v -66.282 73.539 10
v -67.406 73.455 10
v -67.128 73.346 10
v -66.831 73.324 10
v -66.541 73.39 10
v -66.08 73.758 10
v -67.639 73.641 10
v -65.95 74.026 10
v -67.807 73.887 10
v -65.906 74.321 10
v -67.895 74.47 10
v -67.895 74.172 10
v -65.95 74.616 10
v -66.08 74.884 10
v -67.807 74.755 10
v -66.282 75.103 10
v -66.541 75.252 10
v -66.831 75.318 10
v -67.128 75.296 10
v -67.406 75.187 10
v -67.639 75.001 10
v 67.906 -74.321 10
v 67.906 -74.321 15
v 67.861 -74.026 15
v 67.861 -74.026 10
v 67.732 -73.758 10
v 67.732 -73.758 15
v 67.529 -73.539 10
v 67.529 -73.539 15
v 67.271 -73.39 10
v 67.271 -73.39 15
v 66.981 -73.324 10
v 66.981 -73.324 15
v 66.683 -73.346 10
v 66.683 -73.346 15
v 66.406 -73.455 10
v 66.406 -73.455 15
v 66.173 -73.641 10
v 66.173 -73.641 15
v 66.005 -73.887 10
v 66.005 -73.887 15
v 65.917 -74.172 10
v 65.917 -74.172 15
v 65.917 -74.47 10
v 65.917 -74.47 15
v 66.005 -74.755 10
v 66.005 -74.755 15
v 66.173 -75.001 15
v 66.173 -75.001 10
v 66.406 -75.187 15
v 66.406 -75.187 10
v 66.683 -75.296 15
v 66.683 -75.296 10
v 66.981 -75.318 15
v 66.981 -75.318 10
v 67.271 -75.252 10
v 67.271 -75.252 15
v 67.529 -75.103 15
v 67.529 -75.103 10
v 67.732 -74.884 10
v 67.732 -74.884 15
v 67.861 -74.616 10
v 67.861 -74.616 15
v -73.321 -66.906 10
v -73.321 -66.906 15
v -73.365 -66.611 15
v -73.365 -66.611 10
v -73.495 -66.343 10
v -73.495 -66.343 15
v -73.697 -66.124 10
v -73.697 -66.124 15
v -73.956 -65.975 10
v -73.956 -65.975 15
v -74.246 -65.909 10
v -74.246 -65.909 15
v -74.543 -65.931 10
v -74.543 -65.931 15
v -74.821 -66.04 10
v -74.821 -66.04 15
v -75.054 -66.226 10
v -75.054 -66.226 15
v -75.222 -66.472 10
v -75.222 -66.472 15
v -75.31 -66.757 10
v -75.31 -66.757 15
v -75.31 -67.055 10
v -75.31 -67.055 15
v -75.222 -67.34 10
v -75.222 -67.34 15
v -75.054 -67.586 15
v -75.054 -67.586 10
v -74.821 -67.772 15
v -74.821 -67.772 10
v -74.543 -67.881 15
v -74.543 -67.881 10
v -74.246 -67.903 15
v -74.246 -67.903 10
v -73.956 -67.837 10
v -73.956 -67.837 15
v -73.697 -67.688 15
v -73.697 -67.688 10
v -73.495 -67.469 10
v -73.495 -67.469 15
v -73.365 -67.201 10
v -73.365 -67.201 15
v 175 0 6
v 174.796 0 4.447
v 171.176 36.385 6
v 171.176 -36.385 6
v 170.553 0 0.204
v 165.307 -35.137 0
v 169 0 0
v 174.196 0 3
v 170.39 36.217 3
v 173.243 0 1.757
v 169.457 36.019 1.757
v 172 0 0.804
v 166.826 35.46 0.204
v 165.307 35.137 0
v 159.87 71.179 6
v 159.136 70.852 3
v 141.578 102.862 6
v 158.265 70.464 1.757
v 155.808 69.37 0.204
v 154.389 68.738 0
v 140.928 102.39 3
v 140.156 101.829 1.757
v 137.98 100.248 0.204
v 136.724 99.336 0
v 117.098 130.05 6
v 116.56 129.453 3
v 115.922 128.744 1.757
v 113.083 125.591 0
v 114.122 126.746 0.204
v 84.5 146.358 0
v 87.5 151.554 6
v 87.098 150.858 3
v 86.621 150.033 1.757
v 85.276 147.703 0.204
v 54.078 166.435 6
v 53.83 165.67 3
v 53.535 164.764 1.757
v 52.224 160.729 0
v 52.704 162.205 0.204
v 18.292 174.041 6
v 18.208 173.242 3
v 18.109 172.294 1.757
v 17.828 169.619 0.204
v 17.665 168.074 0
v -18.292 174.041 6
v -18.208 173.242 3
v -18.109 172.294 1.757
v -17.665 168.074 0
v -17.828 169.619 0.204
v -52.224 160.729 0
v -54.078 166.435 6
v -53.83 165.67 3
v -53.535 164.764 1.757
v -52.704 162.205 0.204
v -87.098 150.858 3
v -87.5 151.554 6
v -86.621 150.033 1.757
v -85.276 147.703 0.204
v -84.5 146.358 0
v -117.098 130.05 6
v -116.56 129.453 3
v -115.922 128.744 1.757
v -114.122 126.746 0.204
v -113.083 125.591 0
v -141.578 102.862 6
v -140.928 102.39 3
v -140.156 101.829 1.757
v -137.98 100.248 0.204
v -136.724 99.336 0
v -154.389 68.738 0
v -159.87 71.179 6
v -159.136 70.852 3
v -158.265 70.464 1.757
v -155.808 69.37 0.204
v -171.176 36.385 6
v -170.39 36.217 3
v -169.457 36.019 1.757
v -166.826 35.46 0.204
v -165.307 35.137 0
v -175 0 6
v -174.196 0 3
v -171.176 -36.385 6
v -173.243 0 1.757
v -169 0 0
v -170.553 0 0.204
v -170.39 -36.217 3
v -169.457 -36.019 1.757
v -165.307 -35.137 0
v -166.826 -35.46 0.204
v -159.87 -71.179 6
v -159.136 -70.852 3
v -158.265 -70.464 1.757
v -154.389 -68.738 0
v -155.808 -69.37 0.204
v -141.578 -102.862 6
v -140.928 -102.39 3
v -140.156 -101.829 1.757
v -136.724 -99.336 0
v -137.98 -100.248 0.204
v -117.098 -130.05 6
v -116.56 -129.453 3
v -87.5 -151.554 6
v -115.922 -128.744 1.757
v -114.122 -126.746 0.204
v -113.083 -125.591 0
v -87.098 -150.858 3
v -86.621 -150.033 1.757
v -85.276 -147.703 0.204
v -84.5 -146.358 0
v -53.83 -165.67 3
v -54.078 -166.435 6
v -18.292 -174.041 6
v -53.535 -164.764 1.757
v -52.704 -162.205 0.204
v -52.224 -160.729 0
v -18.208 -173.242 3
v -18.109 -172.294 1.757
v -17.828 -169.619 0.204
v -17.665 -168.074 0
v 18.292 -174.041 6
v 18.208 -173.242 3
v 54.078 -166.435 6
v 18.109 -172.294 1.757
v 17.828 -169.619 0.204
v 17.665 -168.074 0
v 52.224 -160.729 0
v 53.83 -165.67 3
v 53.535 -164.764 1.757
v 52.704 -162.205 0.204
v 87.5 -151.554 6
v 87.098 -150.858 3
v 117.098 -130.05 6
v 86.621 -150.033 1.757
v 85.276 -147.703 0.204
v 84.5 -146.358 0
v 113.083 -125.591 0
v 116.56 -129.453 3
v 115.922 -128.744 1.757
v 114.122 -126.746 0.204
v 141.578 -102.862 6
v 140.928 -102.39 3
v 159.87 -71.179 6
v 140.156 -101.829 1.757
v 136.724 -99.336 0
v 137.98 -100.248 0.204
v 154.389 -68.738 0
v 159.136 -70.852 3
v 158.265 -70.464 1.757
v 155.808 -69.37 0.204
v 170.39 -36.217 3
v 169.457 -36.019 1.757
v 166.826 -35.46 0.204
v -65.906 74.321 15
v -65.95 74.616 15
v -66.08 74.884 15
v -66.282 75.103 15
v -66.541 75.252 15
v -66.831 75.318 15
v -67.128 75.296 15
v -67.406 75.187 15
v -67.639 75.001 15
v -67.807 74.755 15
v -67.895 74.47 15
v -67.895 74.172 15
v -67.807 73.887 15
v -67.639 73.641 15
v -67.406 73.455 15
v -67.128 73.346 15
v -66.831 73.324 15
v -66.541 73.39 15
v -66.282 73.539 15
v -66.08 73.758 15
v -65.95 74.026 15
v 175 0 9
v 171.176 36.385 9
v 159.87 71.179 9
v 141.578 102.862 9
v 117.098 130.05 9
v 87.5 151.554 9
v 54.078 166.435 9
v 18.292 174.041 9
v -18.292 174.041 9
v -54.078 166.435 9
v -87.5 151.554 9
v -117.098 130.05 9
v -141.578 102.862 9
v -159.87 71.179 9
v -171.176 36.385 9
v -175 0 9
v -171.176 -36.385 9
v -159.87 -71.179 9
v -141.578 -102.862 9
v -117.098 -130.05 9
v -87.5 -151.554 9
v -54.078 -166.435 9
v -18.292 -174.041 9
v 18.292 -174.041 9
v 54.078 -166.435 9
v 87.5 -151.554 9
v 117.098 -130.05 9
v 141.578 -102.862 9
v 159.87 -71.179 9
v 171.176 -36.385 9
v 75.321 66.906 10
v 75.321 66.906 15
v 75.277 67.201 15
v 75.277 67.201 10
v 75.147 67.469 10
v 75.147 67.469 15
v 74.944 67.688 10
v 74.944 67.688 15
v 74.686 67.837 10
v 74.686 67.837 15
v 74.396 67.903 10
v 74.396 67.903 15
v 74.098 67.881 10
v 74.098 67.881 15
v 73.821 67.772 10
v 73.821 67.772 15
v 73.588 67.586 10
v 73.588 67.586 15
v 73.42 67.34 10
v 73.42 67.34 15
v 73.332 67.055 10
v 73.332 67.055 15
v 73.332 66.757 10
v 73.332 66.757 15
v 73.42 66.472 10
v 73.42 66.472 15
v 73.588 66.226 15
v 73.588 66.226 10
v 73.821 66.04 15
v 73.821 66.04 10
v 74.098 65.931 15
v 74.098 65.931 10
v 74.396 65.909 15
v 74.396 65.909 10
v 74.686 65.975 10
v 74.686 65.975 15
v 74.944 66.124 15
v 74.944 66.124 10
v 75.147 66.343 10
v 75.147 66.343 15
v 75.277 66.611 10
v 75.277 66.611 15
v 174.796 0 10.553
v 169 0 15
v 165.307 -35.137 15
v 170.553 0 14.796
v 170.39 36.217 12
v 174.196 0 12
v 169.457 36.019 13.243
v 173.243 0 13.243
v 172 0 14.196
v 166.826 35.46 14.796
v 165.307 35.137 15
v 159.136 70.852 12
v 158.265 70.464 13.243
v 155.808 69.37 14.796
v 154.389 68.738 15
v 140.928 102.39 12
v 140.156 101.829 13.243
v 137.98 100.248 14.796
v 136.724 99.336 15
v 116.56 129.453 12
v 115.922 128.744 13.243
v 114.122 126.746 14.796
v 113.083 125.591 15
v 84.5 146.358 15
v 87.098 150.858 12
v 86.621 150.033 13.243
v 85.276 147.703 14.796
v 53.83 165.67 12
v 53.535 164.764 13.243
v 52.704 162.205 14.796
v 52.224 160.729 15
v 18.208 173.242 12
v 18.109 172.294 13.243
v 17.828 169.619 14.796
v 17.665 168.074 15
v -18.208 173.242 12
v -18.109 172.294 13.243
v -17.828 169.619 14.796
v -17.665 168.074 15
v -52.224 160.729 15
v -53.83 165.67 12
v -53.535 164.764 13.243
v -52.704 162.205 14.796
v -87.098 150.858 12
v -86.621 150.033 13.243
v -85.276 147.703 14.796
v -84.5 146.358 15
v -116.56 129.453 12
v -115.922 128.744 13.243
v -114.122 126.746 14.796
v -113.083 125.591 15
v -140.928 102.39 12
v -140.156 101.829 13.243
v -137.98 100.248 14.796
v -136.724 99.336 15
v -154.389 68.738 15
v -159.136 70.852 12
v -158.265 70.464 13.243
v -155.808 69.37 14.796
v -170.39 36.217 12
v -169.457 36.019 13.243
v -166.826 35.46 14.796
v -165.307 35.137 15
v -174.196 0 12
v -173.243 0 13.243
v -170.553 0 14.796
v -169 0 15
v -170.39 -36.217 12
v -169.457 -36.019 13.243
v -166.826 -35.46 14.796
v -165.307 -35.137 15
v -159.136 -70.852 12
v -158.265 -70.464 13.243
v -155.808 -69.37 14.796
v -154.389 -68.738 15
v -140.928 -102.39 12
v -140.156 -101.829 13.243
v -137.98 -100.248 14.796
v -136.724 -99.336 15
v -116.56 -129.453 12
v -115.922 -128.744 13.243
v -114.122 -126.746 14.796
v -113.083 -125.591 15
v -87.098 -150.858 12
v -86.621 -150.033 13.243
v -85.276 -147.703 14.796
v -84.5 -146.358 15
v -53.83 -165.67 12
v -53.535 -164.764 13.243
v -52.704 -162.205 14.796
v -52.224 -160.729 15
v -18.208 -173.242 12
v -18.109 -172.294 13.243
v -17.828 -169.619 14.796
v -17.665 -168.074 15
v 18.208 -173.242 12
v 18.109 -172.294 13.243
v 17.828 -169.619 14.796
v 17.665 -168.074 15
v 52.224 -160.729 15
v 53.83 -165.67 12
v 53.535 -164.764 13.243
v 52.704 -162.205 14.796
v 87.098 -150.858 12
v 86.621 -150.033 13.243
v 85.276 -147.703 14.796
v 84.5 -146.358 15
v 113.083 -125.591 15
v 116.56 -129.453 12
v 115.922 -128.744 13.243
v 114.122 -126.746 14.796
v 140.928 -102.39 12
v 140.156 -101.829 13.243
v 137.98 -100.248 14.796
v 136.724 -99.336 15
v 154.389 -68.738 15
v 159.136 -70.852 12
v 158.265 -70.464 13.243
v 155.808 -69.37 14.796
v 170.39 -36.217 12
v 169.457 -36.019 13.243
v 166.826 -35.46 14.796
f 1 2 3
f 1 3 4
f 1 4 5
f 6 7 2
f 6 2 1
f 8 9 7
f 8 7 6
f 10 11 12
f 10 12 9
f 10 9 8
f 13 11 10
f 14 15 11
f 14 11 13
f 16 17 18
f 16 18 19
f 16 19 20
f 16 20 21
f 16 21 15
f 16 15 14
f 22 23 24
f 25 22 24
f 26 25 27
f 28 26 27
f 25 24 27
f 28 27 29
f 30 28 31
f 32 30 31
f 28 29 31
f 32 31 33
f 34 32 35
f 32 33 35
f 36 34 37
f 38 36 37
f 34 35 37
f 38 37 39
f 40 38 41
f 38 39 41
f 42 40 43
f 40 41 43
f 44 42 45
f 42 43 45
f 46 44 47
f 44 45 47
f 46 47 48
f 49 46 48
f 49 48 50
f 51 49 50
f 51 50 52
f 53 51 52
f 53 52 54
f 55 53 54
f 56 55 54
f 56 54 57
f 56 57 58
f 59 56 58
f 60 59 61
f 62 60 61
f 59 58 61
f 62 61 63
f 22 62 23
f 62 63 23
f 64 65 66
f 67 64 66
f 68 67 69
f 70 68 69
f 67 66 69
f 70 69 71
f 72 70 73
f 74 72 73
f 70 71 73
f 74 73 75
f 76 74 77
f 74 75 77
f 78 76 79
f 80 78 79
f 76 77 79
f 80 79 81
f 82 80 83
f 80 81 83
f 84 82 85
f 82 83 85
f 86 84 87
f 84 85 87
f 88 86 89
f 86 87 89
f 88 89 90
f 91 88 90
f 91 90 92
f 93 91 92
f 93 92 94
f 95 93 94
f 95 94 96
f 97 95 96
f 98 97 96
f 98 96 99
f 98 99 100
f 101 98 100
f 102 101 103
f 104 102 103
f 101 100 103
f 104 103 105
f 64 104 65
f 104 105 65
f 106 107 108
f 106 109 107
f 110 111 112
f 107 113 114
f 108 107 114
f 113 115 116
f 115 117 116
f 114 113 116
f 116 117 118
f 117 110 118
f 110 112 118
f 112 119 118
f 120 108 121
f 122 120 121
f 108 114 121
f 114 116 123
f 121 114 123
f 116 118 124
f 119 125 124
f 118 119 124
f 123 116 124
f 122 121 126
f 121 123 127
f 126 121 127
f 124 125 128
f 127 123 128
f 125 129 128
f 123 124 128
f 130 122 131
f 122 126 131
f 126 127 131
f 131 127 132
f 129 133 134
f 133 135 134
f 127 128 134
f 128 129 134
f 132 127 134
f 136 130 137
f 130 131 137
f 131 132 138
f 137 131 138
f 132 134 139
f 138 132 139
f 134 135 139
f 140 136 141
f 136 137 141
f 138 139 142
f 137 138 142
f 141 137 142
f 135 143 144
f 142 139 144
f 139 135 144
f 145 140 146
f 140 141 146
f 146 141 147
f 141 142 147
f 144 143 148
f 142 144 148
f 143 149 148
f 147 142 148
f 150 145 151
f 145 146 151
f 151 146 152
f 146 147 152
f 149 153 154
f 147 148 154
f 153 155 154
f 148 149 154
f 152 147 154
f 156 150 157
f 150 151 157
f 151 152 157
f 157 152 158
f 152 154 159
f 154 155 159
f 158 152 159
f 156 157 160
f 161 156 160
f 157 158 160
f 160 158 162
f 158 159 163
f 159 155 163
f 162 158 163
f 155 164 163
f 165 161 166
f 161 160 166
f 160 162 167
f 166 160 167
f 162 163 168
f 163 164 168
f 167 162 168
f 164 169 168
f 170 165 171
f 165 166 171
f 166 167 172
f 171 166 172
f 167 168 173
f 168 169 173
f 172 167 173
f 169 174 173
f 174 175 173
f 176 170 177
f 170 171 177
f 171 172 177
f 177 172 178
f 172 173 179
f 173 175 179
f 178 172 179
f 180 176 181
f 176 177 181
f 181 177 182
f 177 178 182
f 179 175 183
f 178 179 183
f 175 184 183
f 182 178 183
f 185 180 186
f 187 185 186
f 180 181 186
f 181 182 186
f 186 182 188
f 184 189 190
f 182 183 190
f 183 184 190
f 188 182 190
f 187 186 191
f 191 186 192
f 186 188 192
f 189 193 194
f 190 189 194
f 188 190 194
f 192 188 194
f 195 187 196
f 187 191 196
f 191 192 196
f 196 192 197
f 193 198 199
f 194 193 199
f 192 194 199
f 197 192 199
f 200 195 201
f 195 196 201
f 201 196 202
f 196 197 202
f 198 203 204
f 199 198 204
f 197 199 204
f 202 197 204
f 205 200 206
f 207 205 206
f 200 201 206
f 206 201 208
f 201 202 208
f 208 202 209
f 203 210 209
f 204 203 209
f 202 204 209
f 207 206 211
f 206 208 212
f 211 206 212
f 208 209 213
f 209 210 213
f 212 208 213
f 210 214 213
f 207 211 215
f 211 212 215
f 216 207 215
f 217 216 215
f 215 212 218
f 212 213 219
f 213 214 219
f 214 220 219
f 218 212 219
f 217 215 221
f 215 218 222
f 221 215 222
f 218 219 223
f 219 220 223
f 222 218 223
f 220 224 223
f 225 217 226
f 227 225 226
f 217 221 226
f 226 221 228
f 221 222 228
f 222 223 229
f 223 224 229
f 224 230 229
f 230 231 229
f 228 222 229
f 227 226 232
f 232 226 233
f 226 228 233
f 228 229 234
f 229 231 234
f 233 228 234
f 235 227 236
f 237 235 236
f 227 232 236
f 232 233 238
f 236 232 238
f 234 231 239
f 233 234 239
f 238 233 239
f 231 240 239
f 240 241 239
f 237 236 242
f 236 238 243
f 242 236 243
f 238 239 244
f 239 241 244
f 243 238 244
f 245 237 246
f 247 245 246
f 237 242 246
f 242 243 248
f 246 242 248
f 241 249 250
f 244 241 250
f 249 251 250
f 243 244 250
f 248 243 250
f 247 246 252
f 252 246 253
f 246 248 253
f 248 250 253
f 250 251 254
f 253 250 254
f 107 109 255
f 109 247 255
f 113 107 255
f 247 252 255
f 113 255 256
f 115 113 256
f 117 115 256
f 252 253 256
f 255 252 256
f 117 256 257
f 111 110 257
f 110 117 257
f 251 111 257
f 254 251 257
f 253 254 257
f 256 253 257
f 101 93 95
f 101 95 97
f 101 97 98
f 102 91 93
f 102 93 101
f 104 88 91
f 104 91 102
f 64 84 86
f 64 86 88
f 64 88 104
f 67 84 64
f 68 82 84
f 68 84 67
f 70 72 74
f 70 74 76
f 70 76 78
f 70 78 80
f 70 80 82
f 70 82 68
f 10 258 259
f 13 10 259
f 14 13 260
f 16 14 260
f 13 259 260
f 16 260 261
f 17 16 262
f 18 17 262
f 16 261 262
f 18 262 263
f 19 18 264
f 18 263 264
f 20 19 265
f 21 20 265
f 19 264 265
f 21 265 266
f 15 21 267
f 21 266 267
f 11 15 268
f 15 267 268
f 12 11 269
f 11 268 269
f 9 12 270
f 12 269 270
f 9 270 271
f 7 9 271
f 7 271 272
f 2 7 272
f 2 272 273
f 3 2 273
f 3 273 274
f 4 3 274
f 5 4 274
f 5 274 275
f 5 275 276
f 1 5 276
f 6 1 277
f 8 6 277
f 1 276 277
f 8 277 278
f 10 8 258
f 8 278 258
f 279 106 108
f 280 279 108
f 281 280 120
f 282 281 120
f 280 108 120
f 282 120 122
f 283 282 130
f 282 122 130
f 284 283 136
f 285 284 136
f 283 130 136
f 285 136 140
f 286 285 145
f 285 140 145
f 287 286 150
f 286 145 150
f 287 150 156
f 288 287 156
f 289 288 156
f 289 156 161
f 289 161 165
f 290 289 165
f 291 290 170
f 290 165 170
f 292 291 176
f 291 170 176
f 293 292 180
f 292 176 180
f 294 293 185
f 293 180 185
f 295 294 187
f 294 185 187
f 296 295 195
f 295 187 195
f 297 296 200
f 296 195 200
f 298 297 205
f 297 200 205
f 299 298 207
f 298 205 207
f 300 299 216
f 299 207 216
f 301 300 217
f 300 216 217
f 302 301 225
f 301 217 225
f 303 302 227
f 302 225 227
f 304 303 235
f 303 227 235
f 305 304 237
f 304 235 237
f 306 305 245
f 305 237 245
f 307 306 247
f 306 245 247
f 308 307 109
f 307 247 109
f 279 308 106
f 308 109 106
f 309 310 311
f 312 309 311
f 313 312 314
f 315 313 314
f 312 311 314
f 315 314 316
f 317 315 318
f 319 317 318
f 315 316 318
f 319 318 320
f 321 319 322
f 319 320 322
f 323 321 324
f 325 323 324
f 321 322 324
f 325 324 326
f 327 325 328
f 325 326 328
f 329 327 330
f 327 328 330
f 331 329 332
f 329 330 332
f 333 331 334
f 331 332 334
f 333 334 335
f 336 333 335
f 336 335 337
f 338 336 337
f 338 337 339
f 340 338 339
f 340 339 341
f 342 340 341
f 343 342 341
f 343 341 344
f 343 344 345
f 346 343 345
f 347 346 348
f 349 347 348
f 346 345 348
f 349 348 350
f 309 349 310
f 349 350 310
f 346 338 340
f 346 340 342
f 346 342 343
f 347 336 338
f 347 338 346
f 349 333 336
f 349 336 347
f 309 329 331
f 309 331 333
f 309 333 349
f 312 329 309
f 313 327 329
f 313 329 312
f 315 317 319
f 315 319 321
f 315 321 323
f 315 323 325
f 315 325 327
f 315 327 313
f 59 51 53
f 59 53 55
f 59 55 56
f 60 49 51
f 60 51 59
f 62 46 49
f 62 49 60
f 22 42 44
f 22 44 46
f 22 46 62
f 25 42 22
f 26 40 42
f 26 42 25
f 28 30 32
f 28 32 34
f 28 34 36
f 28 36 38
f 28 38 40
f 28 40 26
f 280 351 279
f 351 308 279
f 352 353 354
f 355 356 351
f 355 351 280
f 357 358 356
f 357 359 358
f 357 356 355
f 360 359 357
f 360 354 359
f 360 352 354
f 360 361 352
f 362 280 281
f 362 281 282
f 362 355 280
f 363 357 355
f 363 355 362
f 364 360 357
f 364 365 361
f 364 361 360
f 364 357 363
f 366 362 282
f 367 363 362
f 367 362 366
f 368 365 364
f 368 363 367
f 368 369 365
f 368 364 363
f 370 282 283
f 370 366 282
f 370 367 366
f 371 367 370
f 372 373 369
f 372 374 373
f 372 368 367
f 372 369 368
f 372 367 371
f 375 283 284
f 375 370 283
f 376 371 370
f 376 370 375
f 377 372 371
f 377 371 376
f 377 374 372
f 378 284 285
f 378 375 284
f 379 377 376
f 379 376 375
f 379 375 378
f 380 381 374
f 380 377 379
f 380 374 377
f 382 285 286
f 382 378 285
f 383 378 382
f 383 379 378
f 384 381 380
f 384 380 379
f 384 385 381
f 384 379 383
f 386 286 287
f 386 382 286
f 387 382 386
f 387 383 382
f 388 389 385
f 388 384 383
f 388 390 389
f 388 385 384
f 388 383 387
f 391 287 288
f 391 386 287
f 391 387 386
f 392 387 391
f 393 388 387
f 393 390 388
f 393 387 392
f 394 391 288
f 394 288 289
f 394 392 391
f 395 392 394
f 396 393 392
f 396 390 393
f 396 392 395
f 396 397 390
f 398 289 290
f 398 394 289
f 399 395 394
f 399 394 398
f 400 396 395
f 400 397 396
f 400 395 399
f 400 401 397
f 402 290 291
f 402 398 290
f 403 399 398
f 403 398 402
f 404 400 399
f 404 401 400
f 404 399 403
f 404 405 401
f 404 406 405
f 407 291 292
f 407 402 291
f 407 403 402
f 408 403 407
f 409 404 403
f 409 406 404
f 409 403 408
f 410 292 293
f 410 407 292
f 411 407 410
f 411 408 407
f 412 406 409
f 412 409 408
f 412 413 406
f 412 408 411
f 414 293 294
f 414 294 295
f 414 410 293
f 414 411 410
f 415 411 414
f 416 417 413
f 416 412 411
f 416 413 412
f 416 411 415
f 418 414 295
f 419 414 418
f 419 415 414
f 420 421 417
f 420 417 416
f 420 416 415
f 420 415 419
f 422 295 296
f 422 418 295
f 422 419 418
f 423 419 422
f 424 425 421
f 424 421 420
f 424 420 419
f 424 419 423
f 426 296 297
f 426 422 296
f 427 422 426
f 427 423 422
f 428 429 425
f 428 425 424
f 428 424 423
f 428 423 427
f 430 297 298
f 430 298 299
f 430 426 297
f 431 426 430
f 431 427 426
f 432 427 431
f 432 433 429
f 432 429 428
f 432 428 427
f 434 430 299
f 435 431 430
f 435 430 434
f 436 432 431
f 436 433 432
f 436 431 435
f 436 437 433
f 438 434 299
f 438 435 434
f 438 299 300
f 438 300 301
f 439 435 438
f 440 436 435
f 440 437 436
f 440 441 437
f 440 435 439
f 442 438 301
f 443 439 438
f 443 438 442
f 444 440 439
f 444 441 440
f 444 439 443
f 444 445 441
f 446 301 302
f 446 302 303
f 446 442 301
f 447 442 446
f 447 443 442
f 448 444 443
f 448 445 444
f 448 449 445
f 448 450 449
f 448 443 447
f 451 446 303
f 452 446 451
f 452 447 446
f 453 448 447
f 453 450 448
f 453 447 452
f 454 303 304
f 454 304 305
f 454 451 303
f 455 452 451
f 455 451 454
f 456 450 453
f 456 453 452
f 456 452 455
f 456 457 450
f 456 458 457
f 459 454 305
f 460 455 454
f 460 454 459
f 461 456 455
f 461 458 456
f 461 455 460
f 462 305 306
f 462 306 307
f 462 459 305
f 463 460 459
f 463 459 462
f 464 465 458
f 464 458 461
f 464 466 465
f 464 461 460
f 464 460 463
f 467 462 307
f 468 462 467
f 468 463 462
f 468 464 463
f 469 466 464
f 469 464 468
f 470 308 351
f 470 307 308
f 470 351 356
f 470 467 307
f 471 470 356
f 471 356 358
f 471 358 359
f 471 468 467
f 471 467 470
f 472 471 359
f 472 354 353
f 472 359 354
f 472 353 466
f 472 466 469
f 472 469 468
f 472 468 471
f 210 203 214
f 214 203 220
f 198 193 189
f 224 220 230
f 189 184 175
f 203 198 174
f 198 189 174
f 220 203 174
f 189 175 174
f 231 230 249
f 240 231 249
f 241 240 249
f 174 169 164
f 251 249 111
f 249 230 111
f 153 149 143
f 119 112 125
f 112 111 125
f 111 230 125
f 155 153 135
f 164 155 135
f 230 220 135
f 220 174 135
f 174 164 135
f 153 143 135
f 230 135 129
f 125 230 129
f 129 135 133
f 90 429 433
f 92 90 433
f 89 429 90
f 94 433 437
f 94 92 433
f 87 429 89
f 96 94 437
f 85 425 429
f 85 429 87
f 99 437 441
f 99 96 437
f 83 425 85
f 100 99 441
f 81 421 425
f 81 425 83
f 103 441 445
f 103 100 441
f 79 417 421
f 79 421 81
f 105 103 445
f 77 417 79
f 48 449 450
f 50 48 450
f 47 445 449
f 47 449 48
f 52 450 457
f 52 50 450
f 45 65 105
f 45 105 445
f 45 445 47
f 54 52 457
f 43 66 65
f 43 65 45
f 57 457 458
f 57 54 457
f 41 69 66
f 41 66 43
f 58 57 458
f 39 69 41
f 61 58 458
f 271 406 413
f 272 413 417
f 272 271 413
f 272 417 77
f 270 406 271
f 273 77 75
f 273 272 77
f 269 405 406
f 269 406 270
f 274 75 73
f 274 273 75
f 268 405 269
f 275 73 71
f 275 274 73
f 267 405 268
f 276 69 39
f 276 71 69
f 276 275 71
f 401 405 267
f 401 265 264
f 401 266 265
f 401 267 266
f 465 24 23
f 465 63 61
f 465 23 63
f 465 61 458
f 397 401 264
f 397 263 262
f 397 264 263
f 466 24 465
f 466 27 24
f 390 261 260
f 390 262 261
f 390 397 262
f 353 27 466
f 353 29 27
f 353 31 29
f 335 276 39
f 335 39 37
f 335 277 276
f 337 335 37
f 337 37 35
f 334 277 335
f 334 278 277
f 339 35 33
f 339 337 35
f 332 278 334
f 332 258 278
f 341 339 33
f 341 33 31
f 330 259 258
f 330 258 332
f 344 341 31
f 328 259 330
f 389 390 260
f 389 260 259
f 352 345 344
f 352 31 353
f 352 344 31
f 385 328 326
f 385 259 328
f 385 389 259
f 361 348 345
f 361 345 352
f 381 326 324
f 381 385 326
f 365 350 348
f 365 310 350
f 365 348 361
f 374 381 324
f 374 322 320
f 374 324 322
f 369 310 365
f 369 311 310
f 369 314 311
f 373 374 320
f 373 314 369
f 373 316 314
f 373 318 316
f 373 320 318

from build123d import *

# Parameters (mm, degrees)
F0_R     = 175
F1_DEPTH = 15
F2_R     = 6
F3_R     = 1
F4_DEPTH = 5


with BuildPart() as f1:
    # F0 (on Top) → F1 (new body)
    with BuildSketch(Plane.XY):
        Circle(F0_R)
    extrude(amount=F1_DEPTH)

    # F2
    f2_edges = [f1.edges().sort_by_distance(p)[0] for p in [
        (-175, 0, 15),
        (-175, 0, 0),
    ]]
    fillet(f2_edges, radius=F2_R)

    # F3 (on face) → F4 (cut)
    with BuildSketch(Plane.XY.offset(15)):
        with Locations((-66.905853, 74.320972)):
            Circle(F3_R)
        with Locations((-74.320972, -66.905853)):
            Circle(F3_R)
        with Locations((66.905853, -74.320972)):
            Circle(F3_R)
        with Locations((74.320972, 66.905853)):
            Circle(F3_R)
    extrude(amount=-F4_DEPTH, mode=Mode.SUBTRACT)


solid = f1.part
